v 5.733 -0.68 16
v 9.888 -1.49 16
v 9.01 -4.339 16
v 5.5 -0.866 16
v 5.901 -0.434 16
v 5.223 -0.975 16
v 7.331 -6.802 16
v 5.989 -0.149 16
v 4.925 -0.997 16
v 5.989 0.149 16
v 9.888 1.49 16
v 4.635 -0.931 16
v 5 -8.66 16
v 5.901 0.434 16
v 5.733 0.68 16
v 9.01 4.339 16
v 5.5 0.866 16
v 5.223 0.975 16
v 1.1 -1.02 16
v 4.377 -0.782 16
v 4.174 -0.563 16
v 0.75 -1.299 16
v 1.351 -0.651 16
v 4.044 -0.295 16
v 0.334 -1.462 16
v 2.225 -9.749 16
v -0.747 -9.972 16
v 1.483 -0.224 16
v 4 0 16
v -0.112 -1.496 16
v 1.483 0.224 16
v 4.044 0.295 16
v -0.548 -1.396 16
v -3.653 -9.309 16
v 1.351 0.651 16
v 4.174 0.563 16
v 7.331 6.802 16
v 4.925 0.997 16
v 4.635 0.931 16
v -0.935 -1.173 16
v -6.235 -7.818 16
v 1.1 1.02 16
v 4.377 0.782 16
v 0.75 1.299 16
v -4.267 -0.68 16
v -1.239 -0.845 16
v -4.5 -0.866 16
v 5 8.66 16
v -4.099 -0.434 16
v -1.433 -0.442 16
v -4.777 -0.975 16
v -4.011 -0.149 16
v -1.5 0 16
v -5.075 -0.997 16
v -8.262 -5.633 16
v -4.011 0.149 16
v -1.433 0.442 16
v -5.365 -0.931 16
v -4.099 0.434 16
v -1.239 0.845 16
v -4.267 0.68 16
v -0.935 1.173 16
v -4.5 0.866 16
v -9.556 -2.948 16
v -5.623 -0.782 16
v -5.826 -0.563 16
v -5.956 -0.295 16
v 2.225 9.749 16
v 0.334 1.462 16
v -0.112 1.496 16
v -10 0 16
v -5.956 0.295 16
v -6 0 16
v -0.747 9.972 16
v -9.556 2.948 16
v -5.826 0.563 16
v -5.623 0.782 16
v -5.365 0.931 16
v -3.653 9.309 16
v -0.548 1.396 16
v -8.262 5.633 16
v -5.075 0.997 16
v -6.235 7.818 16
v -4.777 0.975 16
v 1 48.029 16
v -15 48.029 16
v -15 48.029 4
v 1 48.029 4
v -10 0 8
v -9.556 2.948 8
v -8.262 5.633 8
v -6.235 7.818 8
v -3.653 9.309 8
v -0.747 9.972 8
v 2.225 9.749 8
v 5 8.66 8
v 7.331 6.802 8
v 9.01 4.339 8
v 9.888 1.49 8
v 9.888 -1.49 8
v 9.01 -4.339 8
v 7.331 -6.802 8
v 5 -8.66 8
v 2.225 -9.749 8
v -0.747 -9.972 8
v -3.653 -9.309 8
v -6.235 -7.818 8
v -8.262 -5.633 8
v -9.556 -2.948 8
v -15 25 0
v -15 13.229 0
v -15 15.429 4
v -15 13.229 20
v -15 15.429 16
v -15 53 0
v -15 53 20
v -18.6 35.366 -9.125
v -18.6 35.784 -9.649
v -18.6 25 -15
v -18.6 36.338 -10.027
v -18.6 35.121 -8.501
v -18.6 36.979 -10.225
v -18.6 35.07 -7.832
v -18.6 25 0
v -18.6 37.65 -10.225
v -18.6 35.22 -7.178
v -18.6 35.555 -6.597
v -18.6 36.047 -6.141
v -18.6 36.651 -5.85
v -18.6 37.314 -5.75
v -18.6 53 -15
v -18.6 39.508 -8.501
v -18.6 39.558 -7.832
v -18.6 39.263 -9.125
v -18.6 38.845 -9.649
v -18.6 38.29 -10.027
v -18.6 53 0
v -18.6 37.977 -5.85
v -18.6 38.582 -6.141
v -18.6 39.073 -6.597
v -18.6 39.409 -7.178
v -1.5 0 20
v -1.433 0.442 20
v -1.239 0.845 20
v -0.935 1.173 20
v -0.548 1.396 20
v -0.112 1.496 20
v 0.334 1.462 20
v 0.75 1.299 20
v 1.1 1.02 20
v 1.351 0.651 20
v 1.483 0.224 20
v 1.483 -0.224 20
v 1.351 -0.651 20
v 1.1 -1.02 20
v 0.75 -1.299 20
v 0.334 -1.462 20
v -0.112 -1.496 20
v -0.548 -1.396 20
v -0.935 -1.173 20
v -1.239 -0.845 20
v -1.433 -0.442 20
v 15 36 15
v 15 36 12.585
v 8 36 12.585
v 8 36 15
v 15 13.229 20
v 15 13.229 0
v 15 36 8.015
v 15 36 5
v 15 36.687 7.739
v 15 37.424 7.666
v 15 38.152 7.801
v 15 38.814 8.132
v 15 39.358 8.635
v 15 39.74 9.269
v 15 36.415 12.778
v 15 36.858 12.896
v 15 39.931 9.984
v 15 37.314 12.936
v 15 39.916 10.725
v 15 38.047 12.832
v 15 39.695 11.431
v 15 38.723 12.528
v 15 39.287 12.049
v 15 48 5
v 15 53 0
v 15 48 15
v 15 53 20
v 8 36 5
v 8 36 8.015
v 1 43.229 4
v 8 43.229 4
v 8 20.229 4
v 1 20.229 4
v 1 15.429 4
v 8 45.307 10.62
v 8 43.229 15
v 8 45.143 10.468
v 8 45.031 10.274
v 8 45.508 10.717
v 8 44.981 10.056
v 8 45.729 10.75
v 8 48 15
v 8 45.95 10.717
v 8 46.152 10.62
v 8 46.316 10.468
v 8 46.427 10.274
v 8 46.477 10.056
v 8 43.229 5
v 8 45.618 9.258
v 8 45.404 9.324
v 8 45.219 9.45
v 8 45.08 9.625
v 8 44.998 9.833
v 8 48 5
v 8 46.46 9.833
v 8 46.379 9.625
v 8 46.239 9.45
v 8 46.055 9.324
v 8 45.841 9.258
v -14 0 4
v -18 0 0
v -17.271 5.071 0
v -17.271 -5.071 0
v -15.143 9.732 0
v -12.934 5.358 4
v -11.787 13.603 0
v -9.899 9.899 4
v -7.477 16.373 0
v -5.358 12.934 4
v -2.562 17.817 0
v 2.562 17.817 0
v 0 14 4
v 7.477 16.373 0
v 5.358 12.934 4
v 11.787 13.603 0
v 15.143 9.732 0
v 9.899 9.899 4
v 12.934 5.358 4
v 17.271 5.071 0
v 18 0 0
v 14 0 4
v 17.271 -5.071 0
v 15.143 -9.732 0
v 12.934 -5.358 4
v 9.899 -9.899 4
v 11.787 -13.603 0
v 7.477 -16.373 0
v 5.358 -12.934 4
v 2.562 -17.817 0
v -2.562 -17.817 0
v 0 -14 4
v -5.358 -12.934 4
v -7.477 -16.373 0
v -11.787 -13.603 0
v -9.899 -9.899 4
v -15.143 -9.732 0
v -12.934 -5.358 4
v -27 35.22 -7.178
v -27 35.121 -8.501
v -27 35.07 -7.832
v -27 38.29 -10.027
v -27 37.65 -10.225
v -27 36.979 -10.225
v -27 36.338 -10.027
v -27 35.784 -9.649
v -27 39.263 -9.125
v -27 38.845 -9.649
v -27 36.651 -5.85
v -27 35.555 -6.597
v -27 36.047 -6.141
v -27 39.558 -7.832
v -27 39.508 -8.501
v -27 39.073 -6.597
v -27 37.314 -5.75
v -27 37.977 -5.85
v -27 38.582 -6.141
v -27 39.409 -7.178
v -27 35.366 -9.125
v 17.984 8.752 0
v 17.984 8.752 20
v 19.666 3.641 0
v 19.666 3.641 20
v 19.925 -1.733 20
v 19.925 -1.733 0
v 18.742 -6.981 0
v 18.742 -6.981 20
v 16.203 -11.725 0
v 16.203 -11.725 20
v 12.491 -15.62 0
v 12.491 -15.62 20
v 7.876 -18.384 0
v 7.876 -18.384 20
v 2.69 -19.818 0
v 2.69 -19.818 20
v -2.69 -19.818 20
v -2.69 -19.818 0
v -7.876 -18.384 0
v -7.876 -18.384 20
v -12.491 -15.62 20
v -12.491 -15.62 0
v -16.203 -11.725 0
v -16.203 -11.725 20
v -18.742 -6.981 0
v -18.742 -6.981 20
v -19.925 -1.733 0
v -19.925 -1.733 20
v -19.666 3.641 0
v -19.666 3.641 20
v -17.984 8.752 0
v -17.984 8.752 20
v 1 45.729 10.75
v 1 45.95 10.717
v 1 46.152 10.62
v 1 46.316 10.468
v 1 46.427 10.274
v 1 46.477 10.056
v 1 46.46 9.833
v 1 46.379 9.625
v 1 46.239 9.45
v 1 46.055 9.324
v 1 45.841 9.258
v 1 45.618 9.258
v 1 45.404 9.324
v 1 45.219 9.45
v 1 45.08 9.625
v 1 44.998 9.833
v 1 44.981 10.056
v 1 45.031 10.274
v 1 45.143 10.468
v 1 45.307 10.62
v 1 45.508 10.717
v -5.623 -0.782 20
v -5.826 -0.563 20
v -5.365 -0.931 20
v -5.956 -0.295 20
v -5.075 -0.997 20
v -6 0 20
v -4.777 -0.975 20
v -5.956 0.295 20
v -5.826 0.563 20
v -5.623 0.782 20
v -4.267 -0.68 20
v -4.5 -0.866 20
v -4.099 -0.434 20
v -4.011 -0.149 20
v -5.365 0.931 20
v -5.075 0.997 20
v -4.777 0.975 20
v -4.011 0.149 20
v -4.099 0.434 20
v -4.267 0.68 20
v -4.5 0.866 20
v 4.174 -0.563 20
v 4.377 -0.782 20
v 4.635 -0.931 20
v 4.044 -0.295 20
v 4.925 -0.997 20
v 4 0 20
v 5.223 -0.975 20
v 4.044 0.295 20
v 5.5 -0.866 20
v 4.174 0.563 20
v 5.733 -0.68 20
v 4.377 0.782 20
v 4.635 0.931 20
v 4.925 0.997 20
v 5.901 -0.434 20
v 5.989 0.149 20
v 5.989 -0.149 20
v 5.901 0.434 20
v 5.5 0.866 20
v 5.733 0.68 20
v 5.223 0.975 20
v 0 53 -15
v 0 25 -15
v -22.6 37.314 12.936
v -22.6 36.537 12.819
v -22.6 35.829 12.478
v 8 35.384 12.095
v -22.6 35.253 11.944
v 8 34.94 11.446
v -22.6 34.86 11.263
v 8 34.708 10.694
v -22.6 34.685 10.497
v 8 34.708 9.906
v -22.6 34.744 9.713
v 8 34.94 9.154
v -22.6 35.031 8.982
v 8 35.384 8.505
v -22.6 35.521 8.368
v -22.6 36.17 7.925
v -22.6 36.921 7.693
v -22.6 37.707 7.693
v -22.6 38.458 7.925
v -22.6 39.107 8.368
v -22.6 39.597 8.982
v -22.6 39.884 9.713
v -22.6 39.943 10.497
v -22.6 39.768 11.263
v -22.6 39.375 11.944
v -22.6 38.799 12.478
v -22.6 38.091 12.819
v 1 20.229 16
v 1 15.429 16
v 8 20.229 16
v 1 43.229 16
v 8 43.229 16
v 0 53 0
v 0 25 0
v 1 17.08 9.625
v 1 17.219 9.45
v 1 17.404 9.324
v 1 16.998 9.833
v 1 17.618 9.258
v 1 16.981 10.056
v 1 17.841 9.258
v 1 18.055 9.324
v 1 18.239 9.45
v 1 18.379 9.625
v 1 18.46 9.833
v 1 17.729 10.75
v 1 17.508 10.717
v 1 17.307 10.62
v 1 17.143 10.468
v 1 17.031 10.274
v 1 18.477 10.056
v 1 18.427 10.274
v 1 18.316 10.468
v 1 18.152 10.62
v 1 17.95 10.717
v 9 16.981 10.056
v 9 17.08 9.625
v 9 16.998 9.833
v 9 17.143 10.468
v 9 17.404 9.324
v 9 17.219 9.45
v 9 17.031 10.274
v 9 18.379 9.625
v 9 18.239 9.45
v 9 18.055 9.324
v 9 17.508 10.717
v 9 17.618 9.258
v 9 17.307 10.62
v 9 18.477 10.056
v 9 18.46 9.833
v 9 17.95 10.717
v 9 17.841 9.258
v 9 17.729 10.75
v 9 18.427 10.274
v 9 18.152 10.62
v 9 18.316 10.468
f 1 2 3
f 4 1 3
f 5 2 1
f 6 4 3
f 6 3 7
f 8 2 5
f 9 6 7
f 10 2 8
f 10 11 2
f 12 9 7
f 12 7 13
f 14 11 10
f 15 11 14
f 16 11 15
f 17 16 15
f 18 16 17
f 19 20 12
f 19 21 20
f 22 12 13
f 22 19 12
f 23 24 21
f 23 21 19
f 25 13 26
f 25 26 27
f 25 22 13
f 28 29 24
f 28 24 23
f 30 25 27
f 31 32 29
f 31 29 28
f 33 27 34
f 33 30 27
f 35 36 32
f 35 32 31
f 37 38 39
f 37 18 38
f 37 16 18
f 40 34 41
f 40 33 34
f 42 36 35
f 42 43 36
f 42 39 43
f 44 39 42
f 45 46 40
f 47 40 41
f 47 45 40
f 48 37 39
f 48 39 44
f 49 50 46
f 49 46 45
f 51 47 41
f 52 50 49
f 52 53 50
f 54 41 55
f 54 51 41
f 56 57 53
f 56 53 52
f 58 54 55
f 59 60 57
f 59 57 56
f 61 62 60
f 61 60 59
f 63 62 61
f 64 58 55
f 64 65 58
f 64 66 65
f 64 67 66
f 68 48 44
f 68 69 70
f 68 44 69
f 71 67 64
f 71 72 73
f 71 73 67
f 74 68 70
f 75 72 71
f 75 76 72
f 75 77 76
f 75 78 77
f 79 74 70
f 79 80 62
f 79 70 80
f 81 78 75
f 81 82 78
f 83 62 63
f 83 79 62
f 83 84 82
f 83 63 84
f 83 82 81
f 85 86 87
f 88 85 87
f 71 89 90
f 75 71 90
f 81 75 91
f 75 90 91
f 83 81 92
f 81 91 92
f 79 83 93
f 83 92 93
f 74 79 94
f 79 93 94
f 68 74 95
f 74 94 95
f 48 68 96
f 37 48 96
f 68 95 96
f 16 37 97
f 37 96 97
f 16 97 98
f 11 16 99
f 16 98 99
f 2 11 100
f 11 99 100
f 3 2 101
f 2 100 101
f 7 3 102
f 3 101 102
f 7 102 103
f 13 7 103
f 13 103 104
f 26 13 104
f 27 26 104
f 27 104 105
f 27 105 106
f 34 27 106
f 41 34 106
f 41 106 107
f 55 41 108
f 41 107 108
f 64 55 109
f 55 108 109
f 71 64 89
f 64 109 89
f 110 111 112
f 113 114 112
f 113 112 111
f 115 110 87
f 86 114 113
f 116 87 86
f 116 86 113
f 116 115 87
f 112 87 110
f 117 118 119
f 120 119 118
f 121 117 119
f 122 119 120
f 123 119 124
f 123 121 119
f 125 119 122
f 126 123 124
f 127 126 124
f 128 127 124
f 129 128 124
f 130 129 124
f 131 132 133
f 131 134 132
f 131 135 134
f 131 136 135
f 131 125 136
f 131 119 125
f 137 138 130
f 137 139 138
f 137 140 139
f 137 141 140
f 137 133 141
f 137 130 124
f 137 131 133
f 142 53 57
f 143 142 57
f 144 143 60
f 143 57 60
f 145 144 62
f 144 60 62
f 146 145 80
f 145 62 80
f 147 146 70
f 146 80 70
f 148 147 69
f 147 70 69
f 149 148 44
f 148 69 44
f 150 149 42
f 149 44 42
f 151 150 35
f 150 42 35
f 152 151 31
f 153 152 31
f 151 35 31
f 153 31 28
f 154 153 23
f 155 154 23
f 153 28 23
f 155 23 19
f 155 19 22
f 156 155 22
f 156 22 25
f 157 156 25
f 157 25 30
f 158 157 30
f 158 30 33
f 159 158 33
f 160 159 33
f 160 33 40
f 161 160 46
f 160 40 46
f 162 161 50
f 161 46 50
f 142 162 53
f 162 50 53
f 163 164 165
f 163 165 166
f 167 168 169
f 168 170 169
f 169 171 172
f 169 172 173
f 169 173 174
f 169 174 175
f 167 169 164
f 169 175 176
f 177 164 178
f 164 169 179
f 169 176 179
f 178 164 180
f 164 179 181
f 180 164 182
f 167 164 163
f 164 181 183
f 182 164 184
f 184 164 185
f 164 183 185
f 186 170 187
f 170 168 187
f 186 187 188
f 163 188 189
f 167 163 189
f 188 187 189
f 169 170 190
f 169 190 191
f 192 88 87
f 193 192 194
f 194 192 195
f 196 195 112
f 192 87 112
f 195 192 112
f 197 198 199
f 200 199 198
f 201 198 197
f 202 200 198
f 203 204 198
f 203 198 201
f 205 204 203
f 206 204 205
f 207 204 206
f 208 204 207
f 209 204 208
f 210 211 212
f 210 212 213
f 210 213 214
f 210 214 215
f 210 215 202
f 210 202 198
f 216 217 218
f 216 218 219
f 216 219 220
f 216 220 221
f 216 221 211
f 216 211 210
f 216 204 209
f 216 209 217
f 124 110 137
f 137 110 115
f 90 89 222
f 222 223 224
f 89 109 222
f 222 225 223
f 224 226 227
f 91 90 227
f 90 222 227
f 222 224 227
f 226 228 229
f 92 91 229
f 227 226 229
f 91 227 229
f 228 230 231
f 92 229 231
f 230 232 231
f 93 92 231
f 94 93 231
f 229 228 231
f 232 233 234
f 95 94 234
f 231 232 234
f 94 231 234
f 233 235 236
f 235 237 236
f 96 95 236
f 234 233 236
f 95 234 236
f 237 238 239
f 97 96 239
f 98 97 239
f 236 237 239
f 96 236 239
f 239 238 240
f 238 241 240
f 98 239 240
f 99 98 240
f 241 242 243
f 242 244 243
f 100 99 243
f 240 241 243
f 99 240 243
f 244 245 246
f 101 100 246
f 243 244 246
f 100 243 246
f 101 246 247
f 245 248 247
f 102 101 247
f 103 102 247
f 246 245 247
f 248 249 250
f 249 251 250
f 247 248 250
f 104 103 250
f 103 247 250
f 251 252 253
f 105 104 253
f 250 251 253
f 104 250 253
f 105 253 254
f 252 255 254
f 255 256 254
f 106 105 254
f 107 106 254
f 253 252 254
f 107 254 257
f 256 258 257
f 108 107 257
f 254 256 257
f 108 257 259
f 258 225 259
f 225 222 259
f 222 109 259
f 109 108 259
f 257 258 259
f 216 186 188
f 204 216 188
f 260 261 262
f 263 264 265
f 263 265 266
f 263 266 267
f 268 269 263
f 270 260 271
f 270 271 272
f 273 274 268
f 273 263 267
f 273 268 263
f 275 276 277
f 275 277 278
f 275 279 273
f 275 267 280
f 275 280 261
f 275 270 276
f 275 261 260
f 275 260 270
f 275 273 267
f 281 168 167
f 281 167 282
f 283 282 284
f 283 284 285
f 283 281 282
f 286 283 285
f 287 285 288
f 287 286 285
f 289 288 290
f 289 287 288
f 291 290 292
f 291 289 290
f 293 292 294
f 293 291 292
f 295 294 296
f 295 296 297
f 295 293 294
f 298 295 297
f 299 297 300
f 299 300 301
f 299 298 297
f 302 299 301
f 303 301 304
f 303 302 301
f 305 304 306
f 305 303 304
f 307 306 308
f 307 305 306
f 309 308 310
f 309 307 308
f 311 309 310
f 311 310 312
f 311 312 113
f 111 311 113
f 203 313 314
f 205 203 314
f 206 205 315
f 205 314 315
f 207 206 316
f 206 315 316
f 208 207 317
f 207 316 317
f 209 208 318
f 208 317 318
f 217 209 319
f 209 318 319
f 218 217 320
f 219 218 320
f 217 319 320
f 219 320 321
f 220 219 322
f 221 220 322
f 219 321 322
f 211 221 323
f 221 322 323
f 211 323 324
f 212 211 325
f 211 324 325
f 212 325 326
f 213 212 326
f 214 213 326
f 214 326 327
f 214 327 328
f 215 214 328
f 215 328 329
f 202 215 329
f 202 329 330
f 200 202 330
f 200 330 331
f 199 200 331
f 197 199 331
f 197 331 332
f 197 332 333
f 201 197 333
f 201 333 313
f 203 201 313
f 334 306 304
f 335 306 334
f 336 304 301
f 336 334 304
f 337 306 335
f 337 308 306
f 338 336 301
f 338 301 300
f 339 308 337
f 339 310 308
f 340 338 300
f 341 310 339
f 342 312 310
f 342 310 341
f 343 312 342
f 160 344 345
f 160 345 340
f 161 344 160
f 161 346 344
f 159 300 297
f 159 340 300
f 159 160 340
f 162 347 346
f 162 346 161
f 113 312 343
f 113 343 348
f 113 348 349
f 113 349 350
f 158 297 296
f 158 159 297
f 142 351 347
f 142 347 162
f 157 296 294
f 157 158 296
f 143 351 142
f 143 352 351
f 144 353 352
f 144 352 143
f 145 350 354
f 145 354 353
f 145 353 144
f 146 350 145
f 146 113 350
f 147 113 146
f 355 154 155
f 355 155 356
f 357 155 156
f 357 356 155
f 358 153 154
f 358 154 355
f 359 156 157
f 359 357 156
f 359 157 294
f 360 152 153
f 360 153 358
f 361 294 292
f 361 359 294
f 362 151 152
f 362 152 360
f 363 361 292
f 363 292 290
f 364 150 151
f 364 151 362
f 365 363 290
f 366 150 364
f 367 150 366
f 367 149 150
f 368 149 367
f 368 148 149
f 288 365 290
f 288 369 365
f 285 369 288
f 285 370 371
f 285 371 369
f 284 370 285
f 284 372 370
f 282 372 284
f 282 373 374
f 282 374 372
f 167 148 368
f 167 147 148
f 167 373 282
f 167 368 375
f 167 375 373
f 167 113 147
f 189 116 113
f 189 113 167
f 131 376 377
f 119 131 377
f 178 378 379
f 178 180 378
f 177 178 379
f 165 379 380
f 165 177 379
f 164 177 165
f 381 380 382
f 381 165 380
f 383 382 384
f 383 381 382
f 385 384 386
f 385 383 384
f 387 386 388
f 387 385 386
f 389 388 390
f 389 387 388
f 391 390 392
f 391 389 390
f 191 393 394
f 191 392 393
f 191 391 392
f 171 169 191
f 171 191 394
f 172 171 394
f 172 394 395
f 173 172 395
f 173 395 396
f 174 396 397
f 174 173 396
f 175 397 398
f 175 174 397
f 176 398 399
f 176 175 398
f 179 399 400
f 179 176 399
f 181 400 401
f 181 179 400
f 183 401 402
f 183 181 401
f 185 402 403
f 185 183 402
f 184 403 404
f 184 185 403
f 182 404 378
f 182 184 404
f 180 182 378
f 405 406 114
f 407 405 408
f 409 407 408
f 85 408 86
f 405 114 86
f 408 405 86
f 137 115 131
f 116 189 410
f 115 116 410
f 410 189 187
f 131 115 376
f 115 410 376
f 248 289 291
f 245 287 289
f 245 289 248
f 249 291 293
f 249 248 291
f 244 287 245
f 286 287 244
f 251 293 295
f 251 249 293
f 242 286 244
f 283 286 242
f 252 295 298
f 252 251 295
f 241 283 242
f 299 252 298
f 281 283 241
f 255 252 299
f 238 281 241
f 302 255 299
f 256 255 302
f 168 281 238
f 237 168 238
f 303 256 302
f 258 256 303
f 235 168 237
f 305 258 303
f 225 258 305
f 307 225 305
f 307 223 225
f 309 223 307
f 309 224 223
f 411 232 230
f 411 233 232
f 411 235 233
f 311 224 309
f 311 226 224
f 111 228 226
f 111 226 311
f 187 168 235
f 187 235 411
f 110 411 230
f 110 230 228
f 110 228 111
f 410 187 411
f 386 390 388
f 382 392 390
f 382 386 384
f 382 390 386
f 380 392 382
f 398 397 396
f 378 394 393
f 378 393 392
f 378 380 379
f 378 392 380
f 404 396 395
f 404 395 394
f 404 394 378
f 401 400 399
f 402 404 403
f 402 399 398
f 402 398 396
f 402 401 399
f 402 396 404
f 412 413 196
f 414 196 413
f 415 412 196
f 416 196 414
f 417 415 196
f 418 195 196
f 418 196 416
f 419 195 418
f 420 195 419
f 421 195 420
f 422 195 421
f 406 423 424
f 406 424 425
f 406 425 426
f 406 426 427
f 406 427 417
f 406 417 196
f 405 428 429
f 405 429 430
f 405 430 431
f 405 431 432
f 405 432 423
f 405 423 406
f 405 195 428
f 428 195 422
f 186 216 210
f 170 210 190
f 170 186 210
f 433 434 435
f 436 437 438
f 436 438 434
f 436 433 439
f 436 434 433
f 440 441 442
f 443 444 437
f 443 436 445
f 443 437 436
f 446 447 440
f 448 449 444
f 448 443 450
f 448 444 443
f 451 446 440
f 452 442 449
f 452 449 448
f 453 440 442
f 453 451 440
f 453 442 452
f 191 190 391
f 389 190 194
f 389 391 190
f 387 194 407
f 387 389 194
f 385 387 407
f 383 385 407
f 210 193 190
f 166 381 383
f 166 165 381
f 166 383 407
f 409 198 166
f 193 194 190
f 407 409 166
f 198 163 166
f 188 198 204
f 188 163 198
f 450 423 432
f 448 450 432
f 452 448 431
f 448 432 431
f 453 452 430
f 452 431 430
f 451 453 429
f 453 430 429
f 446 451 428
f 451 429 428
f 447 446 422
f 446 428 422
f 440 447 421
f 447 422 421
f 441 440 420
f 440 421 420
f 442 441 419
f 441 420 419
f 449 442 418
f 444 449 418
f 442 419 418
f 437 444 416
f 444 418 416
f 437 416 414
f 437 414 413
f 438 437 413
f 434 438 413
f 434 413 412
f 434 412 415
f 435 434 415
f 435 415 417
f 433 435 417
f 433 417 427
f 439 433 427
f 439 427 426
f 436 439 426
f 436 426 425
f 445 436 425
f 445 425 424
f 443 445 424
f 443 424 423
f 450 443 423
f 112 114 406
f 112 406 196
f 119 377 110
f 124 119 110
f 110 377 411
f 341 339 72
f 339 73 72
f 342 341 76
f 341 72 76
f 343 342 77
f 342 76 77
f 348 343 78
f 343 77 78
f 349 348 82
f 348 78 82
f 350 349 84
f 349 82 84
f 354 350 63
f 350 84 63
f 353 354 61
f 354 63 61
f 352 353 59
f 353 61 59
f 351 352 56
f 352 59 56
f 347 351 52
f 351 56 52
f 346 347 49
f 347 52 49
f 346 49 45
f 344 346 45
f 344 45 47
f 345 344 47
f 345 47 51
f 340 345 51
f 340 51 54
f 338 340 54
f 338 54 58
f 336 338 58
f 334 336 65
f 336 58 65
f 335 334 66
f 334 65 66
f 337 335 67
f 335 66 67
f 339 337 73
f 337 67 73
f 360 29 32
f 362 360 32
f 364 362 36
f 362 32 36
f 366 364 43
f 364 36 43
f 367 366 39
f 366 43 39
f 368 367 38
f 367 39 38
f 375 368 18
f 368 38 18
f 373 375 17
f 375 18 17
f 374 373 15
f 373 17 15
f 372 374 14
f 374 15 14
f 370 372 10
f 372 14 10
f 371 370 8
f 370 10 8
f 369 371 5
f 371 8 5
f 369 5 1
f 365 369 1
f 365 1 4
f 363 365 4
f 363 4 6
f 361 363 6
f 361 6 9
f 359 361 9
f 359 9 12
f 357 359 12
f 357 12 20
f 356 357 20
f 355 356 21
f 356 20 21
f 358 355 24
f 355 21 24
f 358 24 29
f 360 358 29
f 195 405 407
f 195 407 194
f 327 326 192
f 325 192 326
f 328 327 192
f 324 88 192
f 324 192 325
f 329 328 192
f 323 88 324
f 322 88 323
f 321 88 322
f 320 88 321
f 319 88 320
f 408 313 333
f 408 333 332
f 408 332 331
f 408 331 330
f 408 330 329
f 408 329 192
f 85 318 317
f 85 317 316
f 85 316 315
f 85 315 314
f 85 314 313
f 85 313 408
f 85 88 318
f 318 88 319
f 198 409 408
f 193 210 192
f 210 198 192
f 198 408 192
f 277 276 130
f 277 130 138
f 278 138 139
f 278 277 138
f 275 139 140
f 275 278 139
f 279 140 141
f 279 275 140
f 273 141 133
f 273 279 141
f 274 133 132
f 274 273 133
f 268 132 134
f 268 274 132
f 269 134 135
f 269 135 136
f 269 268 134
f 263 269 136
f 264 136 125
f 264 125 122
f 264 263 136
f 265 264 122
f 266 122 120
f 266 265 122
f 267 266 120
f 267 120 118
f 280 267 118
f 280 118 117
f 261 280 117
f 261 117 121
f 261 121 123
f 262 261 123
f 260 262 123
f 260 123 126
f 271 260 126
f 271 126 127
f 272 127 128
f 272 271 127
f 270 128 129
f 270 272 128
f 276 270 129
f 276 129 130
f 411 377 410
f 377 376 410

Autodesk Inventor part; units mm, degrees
ref_plane "YZ Plane" through (0, 0, 0) normal (1, 0, 0) x (0, 1, 0)
ref_plane "XZ Plane" through (0, 0, 0) normal (0, 1, 0) x (-1, 0, 0)
ref_plane "XY Plane" through (0, 0, 0) normal (0, 0, 1) x (1, 0, 0)
sketch "Sketch1" plane through (0, 0, 0) normal (0, 0, 1) x (1, 0, 0)
  circle A0 centre (0, 0) radius 10
  circle A1 centre (0, 0) radius 20
  line L0 (-15, 0) -> (15, 0)
  line L1 (15, 0) -> (15, 50)
  line L2 (15, 50) -> (-15, 50)
  line L3 (-15, 50) -> (-15, 0)
  point P0 (-15, 13.2288)
  point P1 (15, 13.2288)
  dimension "d0" = 20
  dimension "d1" = 40
  dimension "d2" = 30
  dimension "d3" = 50
extrude "Extrusion1" add sketch "Sketch1" along normal blind 20
sketch "Sketch2" plane through (0, 0, 20) normal (0, 0, 1) x (1, 0, 0)
  circle A0 centre (0, 0) radius 10
  dimension "d6" = 20
extrude "Extrusion2" cut sketch "Sketch2" against normal blind 15
sketch "Sketch4" plane through (-15, 13.2288, 0) normal (-1, 0, 0) x (0, 0, 1)
  line L0 (0, 36.7712) -> (20, 36.7712) projected
  line L1 (0, 0) -> (0, 36.7712) projected
  line L2 (20, 36.7712) -> (0, 36.7712)
  line L3 (0, 36.7712) -> (0, 0)
  line L4 (0, 0) -> (20, 0)
  line L5 (20, 0) -> (20, 36.7712)
  line L6 (0, 0) -> (20, 0) projected
  line L7 (20, 36.7712) -> (10, 36.7712)
  line L8 (10, 36.7712) -> (10, 0)
  line L9 (10, 0) -> (20, 0)
  line L10 (20, 0) -> (20, 36.7712)
  line L11 (10, 0) -> (16, 0)
  line L12 (16, 0) -> (16, 25)
  line L13 (16, 25) -> (10, 25)
  line L14 (10, 25) -> (10, 0)
  line L15 (10, 25) -> (4, 25)
  line L16 (4, 25) -> (4, 0)
  line L17 (4, 0) -> (10, 0)
  line L18 (10, 0) -> (10, 25)
  line L19 (4, 25) -> (16, 25)
  line L20 (16, 25) -> (16, 30.0005)
  line L21 (16, 30.0005) -> (4, 30.0005)
  line L22 (4, 30.0005) -> (4, 25)
  line L23 (4, 30.0005) -> (16, 30.0005)
  line L24 (16, 30.0005) -> (16, 7.0005)
  line L25 (16, 7.0005) -> (4, 7.0005)
  line L26 (4, 7.0005) -> (4, 30.0005)
  line L27 (10, 7.0005) -> (16, 7.0005)
  line L28 (16, 7.0005) -> (16, 0)
  line L29 (16, 0) -> (10, 0)
  line L30 (10, 0) -> (10, 7.0005)
  point P0 (0, -13.2288)
  dimension "d13" = 6
  dimension "d14" = 25
  dimension "d15" = 6
  dimension "d16" = 23
extrude "Extrusion3" cut sketch "Sketch4" against normal blind 23 contours L21 L20 L13 L8 | L8 L15 L22 L21 | L13 L12 L25 L8 | L8 L25 L16 L15
sketch "Sketch6" plane through (-15, 13.2288, 0) normal (-1, 0, 0) x (0, 0, 1)
  line L0 (4, 7.0005) -> (4, 30.0005) projected
  line L1 (4, 7.0005) -> (16, 7.0005)
  line L2 (16, 7.0005) -> (16, 2.2005)
  line L3 (16, 2.2005) -> (4, 2.2005)
  line L4 (4, 2.2005) -> (4, 7.0005)
  line L5 (4, 30.0005) -> (16, 30.0005)
  line L6 (16, 30.0005) -> (16, 34.8005)
  line L7 (16, 34.8005) -> (4, 34.8005)
  line L8 (4, 34.8005) -> (4, 30.0005)
  point P0 (0, -13.2288)
  dimension "d19" = 12
  dimension "d20" = 4.8
  dimension "d21" = 4.8
extrude "Extrusion4" cut sketch "Sketch6" against normal blind 16
sketch "Sketch7" plane through (1, 13.2288, 0) normal (-1, 0, 0) x (0, 0, 1)
  line L0 (4, 30.0005) -> (16, 30.0005) projected
  line L1 (4, 30.0005) -> (10, 30.0005)
  line L2 (10, 30.0005) -> (10, 32.5005)
  line L3 (10, 32.5005) -> (4, 32.5005)
  line L4 (4, 32.5005) -> (4, 30.0005)
  circle A0 centre (10, 32.5005) radius 0.75
  line L5 (16, 7.0005) -> (4, 7.0005) projected
  line L6 (16, 7.0005) -> (16, 2.2005) projected
  line L7 (4, 7.0005) -> (16, 7.0005)
  line L8 (16, 7.0005) -> (16, 4.5005)
  line L9 (16, 4.5005) -> (4, 4.5005)
  line L10 (4, 4.5005) -> (4, 7.0005)
  line L11 (10, 4.5005) -> (4, 4.5005)
  line L12 (4, 4.5005) -> (4, 7.0005)
  line L13 (4, 7.0005) -> (10, 7.0005)
  line L14 (10, 7.0005) -> (10, 4.5005)
  circle A1 centre (10, 4.5005) radius 0.75
  point P0 (0, -13.2288)
  dimension "d24" = 2.5
  dimension "d25" = 1.5
  dimension "d26" = 2.5
  dimension "d27" = 1.5
extrude "Extrusion5" cut sketch "Sketch7" against normal blind 8 contours A0 L3 L2 | L2 L3 A0 | A1 L9 L14 | L14 L9 A1 | A1 L9
sketch "Sketch8" plane through (15, 13.2288, 0) normal (1, 0, 0) x (0, 0, -1)
  line L0 (0, 36.7712) -> (0, 0) projected
  line L1 (-20, 36.7712) -> (-20, 0) projected
  line L2 (0, 36.7712) -> (-20, 36.7712)
  line L3 (-20, 36.7712) -> (-20, 26.7712)
  line L4 (-20, 26.7712) -> (0, 26.7712)
  line L5 (0, 26.7712) -> (0, 36.7712)
  line L6 (0, 26.7712) -> (-20, 26.7712)
  line L7 (-20, 26.7712) -> (-20, 18.7712)
  line L8 (-20, 18.7712) -> (0, 18.7712)
  line L9 (0, 18.7712) -> (0, 26.7712)
  line L10 (0, 26.7712) -> (-10, 26.7712)
  line L11 (-10, 26.7712) -> (-10, 18.7712)
  line L12 (-10, 18.7712) -> (0, 18.7712)
  line L13 (0, 18.7712) -> (0, 26.7712)
  line L14 (-10, 26.7712) -> (-5, 26.7712)
  line L15 (-5, 26.7712) -> (-5, 22.7712)
  line L16 (-5, 22.7712) -> (-10, 22.7712)
  line L17 (-10, 22.7712) -> (-10, 26.7712)
  line L18 (-10, 22.7712) -> (-15, 22.7712)
  line L19 (-15, 22.7712) -> (-15, 26.7712)
  line L20 (-15, 26.7712) -> (-10, 26.7712)
  line L21 (-10, 26.7712) -> (-10, 22.7712)
  point P0 (0, -13.2288)
  dimension "d30" = 10
  dimension "d31" = 8
  dimension "d32" = 5
  dimension "d33" = 5
extrude "Extrusion6" cut sketch "Sketch8" against normal blind 15.8125 contours L15 L16 L11 L4 | L11 L18 L19 L4
sketch "Sketch9" plane through (0, 0, 5) normal (0, 0, 1) x (1, 0, 0)
  circle A0 centre (0, 0) radius 1
  circle A1 centre (7, 0) radius 1.5
  circle A2 centre (0, 0) radius 1.5
  circle A3 centre (-7, 0) radius 1.5
  dimension "d36" = 2
  dimension "d37" = 3
  dimension "d38" = 3
  dimension "d39" = 3
extrude "Extrusion7" cut sketch "Sketch9" against normal blind 8 contours A0 | A1 | A2 | A3
sketch "Sketch10" plane through (-15, 50, 0) normal (0, 1, 0) x (1, 0, 0)
  line L0 (0, 0) -> (0, -20) projected
  line L1 (0, 0) -> (29.4792, 0)
  line L2 (29.4792, 0) -> (29.4792, -20)
  line L3 (29.4792, -20) -> (0, -20)
  line L4 (0, -20) -> (0, 0)
  point P0 (15, 0)
extrude "Extrusion8" add sketch "Sketch10" along normal blind 10
sketch "Sketch11" plane through (0, 0, 0) normal (0, 0, -1) x (-1, 0, 0)
  line L0 (15, 13.2288) -> (15, 60) projected
  line L1 (-15, 13.2288) -> (-15, 50) projected
  line L2 (15, 60) -> (-15, 60)
  line L3 (-15, 60) -> (-15, 45)
  line L4 (-15, 45) -> (15, 45)
  line L5 (15, 45) -> (15, 60)
  line L6 (15, 45) -> (-15, 45)
  line L7 (-15, 45) -> (-15, 35)
  line L8 (-15, 35) -> (15, 35)
  line L9 (15, 35) -> (15, 45)
  point P0 (0, 0)
  dimension "d47" = 15
  dimension "d48" = 10
sketch "Sketch12" plane through (14.4792, 50, 20) normal (1, 0, 0) x (0, 0, -1)
  line L0 (20, 0) -> (20, 10) projected
  line L1 (0, 0) -> (20, 0)
  line L2 (20, 0) -> (20, 10)
  line L3 (20, 10) -> (0, 10)
  line L4 (0, 10) -> (0, 0)
  point P0 (20, -50)
extrude "Extrusion9" cut sketch "Sketch12" against normal blind 59.6125
sketch "Sketch13" plane through (-15, 50, 0) normal (0, 1, 0) x (1, 0, 0)
  line L0 (30, 0) -> (30, -20) projected
  line L1 (0, 0) -> (30, 0)
  line L2 (30, 0) -> (30, -20)
  line L3 (30, -20) -> (0, -20)
  line L4 (0, -20) -> (0, 0)
  point P0 (15, 0)
extrude "Extrusion10" add sketch "Sketch13" along normal blind 10
extrude "Extrusion11" add sketch "Sketch11" along normal blind 10
sketch "Sketch15" plane through (0, 0, 20) normal (0, 0, 1) x (1, 0, 0)
  line L0 (-15, 60) -> (15, 60) projected
  line L1 (-15, 60) -> (0, 60)
  line L2 (0, 60) -> (0, 35)
  line L3 (0, 35) -> (-15, 35)
  line L4 (-15, 35) -> (-15, 60)
  point P0 (0, 0)
  dimension "d56" = 25
extrude "Extrusion12" add sketch "Sketch15" along normal blind 10
sketch "Sketch16" plane through (0, 0, -10) normal (0, 0, -1) x (-1, 0, 0)
  line L0 (-15, 13.2288) -> (-15, 60) projected
  line L1 (0, 35) -> (15, 35) projected
  line L2 (-15, 60) -> (0, 60)
  line L3 (0, 60) -> (0, 35)
  line L4 (0, 35) -> (-15, 35)
  line L5 (-15, 35) -> (-15, 60)
  point P0 (0, 0)
extrude "Extrusion13" cut sketch "Sketch16" against normal blind 10
sketch "Sketch18" plane through (0, 0, 20) normal (0, 0, 1) x (1, 0, 0)
  circle A0 centre (0, 0) radius 10
extrude "Extrusion15" add sketch "Sketch18" against normal blind 16
sketch "Sketch19" plane through (0, 0, 0) normal (0, 0, -1) x (-1, 0, 0)
  circle A0 centre (0, 0) radius 1.5 projected
  circle A1 centre (0, 0) radius 10
  dimension "d72" = 20
extrude "Extrusion16" cut sketch "Sketch19" against normal blind 16
sketch "Sketch20" plane through (0, 0, 4) normal (0, 0, -1) x (-1, 0, 0)
  circle A0 centre (0, 0) radius 1.5 projected
  circle A1 centre (0, 0) radius 1.5
extrude "Extrusion17" cut sketch "Sketch20" against normal blind 30.0375
sketch "Sketch21" plane through (0, 0, 16) normal (0, 0, -1) x (-1, 0, 0)
  circle A0 centre (5, 0) radius 1
  circle A1 centre (-5, 0) radius 1
  point P0 (0, 0)
  dimension "d77" = 2
  dimension "d78" = 2
extrude "Extrusion18" cut sketch "Sketch21" against normal blind 138.2375
chamfer "Chamfer2" distance 8 angle 45 1 edges at (10, 0, 0)
sketch "Sketch33" plane through (15, 13.2288, 20) normal (1, 0, 0) x (0, 0, -1)
  line L0 (5, 26.7712) -> (5, 22.7712) projected
  line L1 (5, 26.7712) -> (15, 26.7712)
  line L2 (15, 26.7712) -> (15, 34.7712)
  line L3 (15, 34.7712) -> (5, 34.7712)
  line L4 (5, 34.7712) -> (5, 26.7712)
  point P0 (20, -13.2288)
  dimension "d110" = 10
  dimension "d111" = 8
extrude "Extrusion27" cut sketch "Sketch33" against normal blind 7
sketch "Sketch41" plane through (-15, 13.2288, 0) normal (-1, 0, 0) x (0, 0, 1)
  line L0 (30, 21.7712) -> (30, 46.7712) projected
  line L1 (30, 21.7712) -> (20, 21.7712)
  line L2 (20, 21.7712) -> (20, 48.4389)
  line L3 (20, 48.4389) -> (30, 48.4389)
  line L4 (30, 48.4389) -> (30, 21.7712)
  point P0 (0, -13.2288)
extrude "Extrusion31" cut sketch "Sketch41" against normal blind 36.0375
sketch "Sketch42" plane through (0, 0, -10) normal (0, 0, -1) x (-1, 0, 0)
  line L0 (0, 35) -> (15, 35) projected
  line L1 (0, 60) -> (0, 35) projected
  line L2 (15, 35) -> (0, 35)
  line L3 (0, 35) -> (0, 60)
  line L4 (0, 60) -> (15, 60)
  line L5 (15, 60) -> (15, 35)
  point P0 (0, 0)
extrude "Extrusion32" add sketch "Sketch42" along normal blind 5
sketch "Sketch43" plane through (-15, 35, 0) normal (0, -1, 0) x (1, 0, 0)
  line L0 (15, -15) -> (15, 0) projected
  line L1 (0, 0) -> (15, 0) projected
  line L2 (15, -15) -> (0, -15)
  line L3 (0, -15) -> (0, 0)
  line L4 (0, 0) -> (15, 0)
  line L5 (15, 0) -> (15, -15)
extrude "Extrusion33" add sketch "Sketch43" along normal blind 10
sketch "Sketch44" plane through (-15, 13.2288, 0) normal (-1, 0, 0) x (0, 0, 1)
  line L0 (16, 2.2005) -> (4, 2.2005) projected
  line L1 (10, 2.2005) -> (10, 34.6918)
  circle A0 centre (10, 24.0854) radius 8
  line L2 (10, 24.0854) -> (-8, 24.0854)
  circle A1 centre (-8, 24.0854) radius 8
  circle A2 centre (-8, 24.0854) radius 2.5
  point P0 (0, -13.2288)
  dimension "d128" = 16
  dimension "d129" = 18
  dimension "d130" = 16
  dimension "d131" = 5
extrude "Extrusion34" add sketch "Sketch44" along normal blind 6 contours A2
sketch "Sketch45" plane through (-15, 60, 0) normal (0, 1, 0) x (1, 0, 0)
  line L0 (0, 0) -> (0, 15) projected
  line L1 (0, -20) -> (30, -20) projected
  line L2 (0, 15) -> (15, 15)
  line L3 (15, 15) -> (15, -20)
  line L4 (15, -20) -> (0, -20)
  line L5 (0, -20) -> (0, 15)
  line L6 (30, -20) -> (30, 0) projected
  line L7 (15, 0) -> (30, 0)
  line L8 (30, 0) -> (30, -20)
  line L9 (30, -20) -> (15, -20)
  line L10 (15, -20) -> (15, 0)
extrude "Extrusion35" cut sketch "Sketch45" against normal blind 7
sketch "Sketch48" plane through (-21, 37.3142, -8) normal (-1, 0, 0) x (0, 0, 1)
  circle A0 centre (0, 0) radius 2.5
  point P0 (8, -37.3142)
extrude "Extrusion36" add sketch "Sketch48" along normal blind 6
sketch "Sketch49" plane through (-15, 13.2288, 0) normal (-1, 0, 0) x (0, 0, 1)
  line L0 (-15, 39.7712) -> (-15, 11.7712) projected
  line L1 (20, 39.7712) -> (-15, 39.7712) projected
  line L2 (-15, 11.7712) -> (0, 11.7712)
  line L3 (0, 11.7712) -> (0, 39.7712)
  line L4 (0, 39.7712) -> (-15, 39.7712)
  line L5 (-15, 39.7712) -> (-15, 11.7712)
  circle A0 centre (-8, 24.0854) radius 2.5 projected
  circle A1 centre (-8, 24.0854) radius 2.5
  point P0 (0, -13.2288)
extrude "Extrusion37" add sketch "Sketch49" along normal blind 3.6
sketch "Sketch53" plane through (-27, 37.3142, -8) normal (-1, 0, 0) x (0, 0, 1)
  circle A0 centre (0, 0) radius 2.5
  circle A1 centre (0, 0) radius 2.25
  point P0 (8, -37.3142)
  dimension "d140" = 4.5
extrude "Extrusion38" cut sketch "Sketch53" against normal blind 8.4
sketch "Sketch55" plane through (-18.6, 13.2288, 0) normal (-1, 0, 0) x (0, 0, 1)
  circle A0 centre (-8, 24.0854) radius 2.25 construction
  line L0 (-8, 24.0854) -> (28.6, 24.0854) construction
  circle A1 centre (10.3, 24.0854) radius 2.6362
  point P0 (0, -13.2288)
  dimension "d149" = 18.3
extrude "Extrusion40" add sketch "Sketch55" against normal up to surface (33.6 mm away)
sketch "Sketch56" plane through (-18.6, 37.3142, 10.3) normal (-1, 0, 0) x (0, 0, 1)
  circle A0 centre (0, 0) radius 2.6362
  point P0 (-10.3, -37.3142)
extrude "Extrusion41" add sketch "Sketch56" along normal blind 4
properties part number "NeWConceptV2.0"
